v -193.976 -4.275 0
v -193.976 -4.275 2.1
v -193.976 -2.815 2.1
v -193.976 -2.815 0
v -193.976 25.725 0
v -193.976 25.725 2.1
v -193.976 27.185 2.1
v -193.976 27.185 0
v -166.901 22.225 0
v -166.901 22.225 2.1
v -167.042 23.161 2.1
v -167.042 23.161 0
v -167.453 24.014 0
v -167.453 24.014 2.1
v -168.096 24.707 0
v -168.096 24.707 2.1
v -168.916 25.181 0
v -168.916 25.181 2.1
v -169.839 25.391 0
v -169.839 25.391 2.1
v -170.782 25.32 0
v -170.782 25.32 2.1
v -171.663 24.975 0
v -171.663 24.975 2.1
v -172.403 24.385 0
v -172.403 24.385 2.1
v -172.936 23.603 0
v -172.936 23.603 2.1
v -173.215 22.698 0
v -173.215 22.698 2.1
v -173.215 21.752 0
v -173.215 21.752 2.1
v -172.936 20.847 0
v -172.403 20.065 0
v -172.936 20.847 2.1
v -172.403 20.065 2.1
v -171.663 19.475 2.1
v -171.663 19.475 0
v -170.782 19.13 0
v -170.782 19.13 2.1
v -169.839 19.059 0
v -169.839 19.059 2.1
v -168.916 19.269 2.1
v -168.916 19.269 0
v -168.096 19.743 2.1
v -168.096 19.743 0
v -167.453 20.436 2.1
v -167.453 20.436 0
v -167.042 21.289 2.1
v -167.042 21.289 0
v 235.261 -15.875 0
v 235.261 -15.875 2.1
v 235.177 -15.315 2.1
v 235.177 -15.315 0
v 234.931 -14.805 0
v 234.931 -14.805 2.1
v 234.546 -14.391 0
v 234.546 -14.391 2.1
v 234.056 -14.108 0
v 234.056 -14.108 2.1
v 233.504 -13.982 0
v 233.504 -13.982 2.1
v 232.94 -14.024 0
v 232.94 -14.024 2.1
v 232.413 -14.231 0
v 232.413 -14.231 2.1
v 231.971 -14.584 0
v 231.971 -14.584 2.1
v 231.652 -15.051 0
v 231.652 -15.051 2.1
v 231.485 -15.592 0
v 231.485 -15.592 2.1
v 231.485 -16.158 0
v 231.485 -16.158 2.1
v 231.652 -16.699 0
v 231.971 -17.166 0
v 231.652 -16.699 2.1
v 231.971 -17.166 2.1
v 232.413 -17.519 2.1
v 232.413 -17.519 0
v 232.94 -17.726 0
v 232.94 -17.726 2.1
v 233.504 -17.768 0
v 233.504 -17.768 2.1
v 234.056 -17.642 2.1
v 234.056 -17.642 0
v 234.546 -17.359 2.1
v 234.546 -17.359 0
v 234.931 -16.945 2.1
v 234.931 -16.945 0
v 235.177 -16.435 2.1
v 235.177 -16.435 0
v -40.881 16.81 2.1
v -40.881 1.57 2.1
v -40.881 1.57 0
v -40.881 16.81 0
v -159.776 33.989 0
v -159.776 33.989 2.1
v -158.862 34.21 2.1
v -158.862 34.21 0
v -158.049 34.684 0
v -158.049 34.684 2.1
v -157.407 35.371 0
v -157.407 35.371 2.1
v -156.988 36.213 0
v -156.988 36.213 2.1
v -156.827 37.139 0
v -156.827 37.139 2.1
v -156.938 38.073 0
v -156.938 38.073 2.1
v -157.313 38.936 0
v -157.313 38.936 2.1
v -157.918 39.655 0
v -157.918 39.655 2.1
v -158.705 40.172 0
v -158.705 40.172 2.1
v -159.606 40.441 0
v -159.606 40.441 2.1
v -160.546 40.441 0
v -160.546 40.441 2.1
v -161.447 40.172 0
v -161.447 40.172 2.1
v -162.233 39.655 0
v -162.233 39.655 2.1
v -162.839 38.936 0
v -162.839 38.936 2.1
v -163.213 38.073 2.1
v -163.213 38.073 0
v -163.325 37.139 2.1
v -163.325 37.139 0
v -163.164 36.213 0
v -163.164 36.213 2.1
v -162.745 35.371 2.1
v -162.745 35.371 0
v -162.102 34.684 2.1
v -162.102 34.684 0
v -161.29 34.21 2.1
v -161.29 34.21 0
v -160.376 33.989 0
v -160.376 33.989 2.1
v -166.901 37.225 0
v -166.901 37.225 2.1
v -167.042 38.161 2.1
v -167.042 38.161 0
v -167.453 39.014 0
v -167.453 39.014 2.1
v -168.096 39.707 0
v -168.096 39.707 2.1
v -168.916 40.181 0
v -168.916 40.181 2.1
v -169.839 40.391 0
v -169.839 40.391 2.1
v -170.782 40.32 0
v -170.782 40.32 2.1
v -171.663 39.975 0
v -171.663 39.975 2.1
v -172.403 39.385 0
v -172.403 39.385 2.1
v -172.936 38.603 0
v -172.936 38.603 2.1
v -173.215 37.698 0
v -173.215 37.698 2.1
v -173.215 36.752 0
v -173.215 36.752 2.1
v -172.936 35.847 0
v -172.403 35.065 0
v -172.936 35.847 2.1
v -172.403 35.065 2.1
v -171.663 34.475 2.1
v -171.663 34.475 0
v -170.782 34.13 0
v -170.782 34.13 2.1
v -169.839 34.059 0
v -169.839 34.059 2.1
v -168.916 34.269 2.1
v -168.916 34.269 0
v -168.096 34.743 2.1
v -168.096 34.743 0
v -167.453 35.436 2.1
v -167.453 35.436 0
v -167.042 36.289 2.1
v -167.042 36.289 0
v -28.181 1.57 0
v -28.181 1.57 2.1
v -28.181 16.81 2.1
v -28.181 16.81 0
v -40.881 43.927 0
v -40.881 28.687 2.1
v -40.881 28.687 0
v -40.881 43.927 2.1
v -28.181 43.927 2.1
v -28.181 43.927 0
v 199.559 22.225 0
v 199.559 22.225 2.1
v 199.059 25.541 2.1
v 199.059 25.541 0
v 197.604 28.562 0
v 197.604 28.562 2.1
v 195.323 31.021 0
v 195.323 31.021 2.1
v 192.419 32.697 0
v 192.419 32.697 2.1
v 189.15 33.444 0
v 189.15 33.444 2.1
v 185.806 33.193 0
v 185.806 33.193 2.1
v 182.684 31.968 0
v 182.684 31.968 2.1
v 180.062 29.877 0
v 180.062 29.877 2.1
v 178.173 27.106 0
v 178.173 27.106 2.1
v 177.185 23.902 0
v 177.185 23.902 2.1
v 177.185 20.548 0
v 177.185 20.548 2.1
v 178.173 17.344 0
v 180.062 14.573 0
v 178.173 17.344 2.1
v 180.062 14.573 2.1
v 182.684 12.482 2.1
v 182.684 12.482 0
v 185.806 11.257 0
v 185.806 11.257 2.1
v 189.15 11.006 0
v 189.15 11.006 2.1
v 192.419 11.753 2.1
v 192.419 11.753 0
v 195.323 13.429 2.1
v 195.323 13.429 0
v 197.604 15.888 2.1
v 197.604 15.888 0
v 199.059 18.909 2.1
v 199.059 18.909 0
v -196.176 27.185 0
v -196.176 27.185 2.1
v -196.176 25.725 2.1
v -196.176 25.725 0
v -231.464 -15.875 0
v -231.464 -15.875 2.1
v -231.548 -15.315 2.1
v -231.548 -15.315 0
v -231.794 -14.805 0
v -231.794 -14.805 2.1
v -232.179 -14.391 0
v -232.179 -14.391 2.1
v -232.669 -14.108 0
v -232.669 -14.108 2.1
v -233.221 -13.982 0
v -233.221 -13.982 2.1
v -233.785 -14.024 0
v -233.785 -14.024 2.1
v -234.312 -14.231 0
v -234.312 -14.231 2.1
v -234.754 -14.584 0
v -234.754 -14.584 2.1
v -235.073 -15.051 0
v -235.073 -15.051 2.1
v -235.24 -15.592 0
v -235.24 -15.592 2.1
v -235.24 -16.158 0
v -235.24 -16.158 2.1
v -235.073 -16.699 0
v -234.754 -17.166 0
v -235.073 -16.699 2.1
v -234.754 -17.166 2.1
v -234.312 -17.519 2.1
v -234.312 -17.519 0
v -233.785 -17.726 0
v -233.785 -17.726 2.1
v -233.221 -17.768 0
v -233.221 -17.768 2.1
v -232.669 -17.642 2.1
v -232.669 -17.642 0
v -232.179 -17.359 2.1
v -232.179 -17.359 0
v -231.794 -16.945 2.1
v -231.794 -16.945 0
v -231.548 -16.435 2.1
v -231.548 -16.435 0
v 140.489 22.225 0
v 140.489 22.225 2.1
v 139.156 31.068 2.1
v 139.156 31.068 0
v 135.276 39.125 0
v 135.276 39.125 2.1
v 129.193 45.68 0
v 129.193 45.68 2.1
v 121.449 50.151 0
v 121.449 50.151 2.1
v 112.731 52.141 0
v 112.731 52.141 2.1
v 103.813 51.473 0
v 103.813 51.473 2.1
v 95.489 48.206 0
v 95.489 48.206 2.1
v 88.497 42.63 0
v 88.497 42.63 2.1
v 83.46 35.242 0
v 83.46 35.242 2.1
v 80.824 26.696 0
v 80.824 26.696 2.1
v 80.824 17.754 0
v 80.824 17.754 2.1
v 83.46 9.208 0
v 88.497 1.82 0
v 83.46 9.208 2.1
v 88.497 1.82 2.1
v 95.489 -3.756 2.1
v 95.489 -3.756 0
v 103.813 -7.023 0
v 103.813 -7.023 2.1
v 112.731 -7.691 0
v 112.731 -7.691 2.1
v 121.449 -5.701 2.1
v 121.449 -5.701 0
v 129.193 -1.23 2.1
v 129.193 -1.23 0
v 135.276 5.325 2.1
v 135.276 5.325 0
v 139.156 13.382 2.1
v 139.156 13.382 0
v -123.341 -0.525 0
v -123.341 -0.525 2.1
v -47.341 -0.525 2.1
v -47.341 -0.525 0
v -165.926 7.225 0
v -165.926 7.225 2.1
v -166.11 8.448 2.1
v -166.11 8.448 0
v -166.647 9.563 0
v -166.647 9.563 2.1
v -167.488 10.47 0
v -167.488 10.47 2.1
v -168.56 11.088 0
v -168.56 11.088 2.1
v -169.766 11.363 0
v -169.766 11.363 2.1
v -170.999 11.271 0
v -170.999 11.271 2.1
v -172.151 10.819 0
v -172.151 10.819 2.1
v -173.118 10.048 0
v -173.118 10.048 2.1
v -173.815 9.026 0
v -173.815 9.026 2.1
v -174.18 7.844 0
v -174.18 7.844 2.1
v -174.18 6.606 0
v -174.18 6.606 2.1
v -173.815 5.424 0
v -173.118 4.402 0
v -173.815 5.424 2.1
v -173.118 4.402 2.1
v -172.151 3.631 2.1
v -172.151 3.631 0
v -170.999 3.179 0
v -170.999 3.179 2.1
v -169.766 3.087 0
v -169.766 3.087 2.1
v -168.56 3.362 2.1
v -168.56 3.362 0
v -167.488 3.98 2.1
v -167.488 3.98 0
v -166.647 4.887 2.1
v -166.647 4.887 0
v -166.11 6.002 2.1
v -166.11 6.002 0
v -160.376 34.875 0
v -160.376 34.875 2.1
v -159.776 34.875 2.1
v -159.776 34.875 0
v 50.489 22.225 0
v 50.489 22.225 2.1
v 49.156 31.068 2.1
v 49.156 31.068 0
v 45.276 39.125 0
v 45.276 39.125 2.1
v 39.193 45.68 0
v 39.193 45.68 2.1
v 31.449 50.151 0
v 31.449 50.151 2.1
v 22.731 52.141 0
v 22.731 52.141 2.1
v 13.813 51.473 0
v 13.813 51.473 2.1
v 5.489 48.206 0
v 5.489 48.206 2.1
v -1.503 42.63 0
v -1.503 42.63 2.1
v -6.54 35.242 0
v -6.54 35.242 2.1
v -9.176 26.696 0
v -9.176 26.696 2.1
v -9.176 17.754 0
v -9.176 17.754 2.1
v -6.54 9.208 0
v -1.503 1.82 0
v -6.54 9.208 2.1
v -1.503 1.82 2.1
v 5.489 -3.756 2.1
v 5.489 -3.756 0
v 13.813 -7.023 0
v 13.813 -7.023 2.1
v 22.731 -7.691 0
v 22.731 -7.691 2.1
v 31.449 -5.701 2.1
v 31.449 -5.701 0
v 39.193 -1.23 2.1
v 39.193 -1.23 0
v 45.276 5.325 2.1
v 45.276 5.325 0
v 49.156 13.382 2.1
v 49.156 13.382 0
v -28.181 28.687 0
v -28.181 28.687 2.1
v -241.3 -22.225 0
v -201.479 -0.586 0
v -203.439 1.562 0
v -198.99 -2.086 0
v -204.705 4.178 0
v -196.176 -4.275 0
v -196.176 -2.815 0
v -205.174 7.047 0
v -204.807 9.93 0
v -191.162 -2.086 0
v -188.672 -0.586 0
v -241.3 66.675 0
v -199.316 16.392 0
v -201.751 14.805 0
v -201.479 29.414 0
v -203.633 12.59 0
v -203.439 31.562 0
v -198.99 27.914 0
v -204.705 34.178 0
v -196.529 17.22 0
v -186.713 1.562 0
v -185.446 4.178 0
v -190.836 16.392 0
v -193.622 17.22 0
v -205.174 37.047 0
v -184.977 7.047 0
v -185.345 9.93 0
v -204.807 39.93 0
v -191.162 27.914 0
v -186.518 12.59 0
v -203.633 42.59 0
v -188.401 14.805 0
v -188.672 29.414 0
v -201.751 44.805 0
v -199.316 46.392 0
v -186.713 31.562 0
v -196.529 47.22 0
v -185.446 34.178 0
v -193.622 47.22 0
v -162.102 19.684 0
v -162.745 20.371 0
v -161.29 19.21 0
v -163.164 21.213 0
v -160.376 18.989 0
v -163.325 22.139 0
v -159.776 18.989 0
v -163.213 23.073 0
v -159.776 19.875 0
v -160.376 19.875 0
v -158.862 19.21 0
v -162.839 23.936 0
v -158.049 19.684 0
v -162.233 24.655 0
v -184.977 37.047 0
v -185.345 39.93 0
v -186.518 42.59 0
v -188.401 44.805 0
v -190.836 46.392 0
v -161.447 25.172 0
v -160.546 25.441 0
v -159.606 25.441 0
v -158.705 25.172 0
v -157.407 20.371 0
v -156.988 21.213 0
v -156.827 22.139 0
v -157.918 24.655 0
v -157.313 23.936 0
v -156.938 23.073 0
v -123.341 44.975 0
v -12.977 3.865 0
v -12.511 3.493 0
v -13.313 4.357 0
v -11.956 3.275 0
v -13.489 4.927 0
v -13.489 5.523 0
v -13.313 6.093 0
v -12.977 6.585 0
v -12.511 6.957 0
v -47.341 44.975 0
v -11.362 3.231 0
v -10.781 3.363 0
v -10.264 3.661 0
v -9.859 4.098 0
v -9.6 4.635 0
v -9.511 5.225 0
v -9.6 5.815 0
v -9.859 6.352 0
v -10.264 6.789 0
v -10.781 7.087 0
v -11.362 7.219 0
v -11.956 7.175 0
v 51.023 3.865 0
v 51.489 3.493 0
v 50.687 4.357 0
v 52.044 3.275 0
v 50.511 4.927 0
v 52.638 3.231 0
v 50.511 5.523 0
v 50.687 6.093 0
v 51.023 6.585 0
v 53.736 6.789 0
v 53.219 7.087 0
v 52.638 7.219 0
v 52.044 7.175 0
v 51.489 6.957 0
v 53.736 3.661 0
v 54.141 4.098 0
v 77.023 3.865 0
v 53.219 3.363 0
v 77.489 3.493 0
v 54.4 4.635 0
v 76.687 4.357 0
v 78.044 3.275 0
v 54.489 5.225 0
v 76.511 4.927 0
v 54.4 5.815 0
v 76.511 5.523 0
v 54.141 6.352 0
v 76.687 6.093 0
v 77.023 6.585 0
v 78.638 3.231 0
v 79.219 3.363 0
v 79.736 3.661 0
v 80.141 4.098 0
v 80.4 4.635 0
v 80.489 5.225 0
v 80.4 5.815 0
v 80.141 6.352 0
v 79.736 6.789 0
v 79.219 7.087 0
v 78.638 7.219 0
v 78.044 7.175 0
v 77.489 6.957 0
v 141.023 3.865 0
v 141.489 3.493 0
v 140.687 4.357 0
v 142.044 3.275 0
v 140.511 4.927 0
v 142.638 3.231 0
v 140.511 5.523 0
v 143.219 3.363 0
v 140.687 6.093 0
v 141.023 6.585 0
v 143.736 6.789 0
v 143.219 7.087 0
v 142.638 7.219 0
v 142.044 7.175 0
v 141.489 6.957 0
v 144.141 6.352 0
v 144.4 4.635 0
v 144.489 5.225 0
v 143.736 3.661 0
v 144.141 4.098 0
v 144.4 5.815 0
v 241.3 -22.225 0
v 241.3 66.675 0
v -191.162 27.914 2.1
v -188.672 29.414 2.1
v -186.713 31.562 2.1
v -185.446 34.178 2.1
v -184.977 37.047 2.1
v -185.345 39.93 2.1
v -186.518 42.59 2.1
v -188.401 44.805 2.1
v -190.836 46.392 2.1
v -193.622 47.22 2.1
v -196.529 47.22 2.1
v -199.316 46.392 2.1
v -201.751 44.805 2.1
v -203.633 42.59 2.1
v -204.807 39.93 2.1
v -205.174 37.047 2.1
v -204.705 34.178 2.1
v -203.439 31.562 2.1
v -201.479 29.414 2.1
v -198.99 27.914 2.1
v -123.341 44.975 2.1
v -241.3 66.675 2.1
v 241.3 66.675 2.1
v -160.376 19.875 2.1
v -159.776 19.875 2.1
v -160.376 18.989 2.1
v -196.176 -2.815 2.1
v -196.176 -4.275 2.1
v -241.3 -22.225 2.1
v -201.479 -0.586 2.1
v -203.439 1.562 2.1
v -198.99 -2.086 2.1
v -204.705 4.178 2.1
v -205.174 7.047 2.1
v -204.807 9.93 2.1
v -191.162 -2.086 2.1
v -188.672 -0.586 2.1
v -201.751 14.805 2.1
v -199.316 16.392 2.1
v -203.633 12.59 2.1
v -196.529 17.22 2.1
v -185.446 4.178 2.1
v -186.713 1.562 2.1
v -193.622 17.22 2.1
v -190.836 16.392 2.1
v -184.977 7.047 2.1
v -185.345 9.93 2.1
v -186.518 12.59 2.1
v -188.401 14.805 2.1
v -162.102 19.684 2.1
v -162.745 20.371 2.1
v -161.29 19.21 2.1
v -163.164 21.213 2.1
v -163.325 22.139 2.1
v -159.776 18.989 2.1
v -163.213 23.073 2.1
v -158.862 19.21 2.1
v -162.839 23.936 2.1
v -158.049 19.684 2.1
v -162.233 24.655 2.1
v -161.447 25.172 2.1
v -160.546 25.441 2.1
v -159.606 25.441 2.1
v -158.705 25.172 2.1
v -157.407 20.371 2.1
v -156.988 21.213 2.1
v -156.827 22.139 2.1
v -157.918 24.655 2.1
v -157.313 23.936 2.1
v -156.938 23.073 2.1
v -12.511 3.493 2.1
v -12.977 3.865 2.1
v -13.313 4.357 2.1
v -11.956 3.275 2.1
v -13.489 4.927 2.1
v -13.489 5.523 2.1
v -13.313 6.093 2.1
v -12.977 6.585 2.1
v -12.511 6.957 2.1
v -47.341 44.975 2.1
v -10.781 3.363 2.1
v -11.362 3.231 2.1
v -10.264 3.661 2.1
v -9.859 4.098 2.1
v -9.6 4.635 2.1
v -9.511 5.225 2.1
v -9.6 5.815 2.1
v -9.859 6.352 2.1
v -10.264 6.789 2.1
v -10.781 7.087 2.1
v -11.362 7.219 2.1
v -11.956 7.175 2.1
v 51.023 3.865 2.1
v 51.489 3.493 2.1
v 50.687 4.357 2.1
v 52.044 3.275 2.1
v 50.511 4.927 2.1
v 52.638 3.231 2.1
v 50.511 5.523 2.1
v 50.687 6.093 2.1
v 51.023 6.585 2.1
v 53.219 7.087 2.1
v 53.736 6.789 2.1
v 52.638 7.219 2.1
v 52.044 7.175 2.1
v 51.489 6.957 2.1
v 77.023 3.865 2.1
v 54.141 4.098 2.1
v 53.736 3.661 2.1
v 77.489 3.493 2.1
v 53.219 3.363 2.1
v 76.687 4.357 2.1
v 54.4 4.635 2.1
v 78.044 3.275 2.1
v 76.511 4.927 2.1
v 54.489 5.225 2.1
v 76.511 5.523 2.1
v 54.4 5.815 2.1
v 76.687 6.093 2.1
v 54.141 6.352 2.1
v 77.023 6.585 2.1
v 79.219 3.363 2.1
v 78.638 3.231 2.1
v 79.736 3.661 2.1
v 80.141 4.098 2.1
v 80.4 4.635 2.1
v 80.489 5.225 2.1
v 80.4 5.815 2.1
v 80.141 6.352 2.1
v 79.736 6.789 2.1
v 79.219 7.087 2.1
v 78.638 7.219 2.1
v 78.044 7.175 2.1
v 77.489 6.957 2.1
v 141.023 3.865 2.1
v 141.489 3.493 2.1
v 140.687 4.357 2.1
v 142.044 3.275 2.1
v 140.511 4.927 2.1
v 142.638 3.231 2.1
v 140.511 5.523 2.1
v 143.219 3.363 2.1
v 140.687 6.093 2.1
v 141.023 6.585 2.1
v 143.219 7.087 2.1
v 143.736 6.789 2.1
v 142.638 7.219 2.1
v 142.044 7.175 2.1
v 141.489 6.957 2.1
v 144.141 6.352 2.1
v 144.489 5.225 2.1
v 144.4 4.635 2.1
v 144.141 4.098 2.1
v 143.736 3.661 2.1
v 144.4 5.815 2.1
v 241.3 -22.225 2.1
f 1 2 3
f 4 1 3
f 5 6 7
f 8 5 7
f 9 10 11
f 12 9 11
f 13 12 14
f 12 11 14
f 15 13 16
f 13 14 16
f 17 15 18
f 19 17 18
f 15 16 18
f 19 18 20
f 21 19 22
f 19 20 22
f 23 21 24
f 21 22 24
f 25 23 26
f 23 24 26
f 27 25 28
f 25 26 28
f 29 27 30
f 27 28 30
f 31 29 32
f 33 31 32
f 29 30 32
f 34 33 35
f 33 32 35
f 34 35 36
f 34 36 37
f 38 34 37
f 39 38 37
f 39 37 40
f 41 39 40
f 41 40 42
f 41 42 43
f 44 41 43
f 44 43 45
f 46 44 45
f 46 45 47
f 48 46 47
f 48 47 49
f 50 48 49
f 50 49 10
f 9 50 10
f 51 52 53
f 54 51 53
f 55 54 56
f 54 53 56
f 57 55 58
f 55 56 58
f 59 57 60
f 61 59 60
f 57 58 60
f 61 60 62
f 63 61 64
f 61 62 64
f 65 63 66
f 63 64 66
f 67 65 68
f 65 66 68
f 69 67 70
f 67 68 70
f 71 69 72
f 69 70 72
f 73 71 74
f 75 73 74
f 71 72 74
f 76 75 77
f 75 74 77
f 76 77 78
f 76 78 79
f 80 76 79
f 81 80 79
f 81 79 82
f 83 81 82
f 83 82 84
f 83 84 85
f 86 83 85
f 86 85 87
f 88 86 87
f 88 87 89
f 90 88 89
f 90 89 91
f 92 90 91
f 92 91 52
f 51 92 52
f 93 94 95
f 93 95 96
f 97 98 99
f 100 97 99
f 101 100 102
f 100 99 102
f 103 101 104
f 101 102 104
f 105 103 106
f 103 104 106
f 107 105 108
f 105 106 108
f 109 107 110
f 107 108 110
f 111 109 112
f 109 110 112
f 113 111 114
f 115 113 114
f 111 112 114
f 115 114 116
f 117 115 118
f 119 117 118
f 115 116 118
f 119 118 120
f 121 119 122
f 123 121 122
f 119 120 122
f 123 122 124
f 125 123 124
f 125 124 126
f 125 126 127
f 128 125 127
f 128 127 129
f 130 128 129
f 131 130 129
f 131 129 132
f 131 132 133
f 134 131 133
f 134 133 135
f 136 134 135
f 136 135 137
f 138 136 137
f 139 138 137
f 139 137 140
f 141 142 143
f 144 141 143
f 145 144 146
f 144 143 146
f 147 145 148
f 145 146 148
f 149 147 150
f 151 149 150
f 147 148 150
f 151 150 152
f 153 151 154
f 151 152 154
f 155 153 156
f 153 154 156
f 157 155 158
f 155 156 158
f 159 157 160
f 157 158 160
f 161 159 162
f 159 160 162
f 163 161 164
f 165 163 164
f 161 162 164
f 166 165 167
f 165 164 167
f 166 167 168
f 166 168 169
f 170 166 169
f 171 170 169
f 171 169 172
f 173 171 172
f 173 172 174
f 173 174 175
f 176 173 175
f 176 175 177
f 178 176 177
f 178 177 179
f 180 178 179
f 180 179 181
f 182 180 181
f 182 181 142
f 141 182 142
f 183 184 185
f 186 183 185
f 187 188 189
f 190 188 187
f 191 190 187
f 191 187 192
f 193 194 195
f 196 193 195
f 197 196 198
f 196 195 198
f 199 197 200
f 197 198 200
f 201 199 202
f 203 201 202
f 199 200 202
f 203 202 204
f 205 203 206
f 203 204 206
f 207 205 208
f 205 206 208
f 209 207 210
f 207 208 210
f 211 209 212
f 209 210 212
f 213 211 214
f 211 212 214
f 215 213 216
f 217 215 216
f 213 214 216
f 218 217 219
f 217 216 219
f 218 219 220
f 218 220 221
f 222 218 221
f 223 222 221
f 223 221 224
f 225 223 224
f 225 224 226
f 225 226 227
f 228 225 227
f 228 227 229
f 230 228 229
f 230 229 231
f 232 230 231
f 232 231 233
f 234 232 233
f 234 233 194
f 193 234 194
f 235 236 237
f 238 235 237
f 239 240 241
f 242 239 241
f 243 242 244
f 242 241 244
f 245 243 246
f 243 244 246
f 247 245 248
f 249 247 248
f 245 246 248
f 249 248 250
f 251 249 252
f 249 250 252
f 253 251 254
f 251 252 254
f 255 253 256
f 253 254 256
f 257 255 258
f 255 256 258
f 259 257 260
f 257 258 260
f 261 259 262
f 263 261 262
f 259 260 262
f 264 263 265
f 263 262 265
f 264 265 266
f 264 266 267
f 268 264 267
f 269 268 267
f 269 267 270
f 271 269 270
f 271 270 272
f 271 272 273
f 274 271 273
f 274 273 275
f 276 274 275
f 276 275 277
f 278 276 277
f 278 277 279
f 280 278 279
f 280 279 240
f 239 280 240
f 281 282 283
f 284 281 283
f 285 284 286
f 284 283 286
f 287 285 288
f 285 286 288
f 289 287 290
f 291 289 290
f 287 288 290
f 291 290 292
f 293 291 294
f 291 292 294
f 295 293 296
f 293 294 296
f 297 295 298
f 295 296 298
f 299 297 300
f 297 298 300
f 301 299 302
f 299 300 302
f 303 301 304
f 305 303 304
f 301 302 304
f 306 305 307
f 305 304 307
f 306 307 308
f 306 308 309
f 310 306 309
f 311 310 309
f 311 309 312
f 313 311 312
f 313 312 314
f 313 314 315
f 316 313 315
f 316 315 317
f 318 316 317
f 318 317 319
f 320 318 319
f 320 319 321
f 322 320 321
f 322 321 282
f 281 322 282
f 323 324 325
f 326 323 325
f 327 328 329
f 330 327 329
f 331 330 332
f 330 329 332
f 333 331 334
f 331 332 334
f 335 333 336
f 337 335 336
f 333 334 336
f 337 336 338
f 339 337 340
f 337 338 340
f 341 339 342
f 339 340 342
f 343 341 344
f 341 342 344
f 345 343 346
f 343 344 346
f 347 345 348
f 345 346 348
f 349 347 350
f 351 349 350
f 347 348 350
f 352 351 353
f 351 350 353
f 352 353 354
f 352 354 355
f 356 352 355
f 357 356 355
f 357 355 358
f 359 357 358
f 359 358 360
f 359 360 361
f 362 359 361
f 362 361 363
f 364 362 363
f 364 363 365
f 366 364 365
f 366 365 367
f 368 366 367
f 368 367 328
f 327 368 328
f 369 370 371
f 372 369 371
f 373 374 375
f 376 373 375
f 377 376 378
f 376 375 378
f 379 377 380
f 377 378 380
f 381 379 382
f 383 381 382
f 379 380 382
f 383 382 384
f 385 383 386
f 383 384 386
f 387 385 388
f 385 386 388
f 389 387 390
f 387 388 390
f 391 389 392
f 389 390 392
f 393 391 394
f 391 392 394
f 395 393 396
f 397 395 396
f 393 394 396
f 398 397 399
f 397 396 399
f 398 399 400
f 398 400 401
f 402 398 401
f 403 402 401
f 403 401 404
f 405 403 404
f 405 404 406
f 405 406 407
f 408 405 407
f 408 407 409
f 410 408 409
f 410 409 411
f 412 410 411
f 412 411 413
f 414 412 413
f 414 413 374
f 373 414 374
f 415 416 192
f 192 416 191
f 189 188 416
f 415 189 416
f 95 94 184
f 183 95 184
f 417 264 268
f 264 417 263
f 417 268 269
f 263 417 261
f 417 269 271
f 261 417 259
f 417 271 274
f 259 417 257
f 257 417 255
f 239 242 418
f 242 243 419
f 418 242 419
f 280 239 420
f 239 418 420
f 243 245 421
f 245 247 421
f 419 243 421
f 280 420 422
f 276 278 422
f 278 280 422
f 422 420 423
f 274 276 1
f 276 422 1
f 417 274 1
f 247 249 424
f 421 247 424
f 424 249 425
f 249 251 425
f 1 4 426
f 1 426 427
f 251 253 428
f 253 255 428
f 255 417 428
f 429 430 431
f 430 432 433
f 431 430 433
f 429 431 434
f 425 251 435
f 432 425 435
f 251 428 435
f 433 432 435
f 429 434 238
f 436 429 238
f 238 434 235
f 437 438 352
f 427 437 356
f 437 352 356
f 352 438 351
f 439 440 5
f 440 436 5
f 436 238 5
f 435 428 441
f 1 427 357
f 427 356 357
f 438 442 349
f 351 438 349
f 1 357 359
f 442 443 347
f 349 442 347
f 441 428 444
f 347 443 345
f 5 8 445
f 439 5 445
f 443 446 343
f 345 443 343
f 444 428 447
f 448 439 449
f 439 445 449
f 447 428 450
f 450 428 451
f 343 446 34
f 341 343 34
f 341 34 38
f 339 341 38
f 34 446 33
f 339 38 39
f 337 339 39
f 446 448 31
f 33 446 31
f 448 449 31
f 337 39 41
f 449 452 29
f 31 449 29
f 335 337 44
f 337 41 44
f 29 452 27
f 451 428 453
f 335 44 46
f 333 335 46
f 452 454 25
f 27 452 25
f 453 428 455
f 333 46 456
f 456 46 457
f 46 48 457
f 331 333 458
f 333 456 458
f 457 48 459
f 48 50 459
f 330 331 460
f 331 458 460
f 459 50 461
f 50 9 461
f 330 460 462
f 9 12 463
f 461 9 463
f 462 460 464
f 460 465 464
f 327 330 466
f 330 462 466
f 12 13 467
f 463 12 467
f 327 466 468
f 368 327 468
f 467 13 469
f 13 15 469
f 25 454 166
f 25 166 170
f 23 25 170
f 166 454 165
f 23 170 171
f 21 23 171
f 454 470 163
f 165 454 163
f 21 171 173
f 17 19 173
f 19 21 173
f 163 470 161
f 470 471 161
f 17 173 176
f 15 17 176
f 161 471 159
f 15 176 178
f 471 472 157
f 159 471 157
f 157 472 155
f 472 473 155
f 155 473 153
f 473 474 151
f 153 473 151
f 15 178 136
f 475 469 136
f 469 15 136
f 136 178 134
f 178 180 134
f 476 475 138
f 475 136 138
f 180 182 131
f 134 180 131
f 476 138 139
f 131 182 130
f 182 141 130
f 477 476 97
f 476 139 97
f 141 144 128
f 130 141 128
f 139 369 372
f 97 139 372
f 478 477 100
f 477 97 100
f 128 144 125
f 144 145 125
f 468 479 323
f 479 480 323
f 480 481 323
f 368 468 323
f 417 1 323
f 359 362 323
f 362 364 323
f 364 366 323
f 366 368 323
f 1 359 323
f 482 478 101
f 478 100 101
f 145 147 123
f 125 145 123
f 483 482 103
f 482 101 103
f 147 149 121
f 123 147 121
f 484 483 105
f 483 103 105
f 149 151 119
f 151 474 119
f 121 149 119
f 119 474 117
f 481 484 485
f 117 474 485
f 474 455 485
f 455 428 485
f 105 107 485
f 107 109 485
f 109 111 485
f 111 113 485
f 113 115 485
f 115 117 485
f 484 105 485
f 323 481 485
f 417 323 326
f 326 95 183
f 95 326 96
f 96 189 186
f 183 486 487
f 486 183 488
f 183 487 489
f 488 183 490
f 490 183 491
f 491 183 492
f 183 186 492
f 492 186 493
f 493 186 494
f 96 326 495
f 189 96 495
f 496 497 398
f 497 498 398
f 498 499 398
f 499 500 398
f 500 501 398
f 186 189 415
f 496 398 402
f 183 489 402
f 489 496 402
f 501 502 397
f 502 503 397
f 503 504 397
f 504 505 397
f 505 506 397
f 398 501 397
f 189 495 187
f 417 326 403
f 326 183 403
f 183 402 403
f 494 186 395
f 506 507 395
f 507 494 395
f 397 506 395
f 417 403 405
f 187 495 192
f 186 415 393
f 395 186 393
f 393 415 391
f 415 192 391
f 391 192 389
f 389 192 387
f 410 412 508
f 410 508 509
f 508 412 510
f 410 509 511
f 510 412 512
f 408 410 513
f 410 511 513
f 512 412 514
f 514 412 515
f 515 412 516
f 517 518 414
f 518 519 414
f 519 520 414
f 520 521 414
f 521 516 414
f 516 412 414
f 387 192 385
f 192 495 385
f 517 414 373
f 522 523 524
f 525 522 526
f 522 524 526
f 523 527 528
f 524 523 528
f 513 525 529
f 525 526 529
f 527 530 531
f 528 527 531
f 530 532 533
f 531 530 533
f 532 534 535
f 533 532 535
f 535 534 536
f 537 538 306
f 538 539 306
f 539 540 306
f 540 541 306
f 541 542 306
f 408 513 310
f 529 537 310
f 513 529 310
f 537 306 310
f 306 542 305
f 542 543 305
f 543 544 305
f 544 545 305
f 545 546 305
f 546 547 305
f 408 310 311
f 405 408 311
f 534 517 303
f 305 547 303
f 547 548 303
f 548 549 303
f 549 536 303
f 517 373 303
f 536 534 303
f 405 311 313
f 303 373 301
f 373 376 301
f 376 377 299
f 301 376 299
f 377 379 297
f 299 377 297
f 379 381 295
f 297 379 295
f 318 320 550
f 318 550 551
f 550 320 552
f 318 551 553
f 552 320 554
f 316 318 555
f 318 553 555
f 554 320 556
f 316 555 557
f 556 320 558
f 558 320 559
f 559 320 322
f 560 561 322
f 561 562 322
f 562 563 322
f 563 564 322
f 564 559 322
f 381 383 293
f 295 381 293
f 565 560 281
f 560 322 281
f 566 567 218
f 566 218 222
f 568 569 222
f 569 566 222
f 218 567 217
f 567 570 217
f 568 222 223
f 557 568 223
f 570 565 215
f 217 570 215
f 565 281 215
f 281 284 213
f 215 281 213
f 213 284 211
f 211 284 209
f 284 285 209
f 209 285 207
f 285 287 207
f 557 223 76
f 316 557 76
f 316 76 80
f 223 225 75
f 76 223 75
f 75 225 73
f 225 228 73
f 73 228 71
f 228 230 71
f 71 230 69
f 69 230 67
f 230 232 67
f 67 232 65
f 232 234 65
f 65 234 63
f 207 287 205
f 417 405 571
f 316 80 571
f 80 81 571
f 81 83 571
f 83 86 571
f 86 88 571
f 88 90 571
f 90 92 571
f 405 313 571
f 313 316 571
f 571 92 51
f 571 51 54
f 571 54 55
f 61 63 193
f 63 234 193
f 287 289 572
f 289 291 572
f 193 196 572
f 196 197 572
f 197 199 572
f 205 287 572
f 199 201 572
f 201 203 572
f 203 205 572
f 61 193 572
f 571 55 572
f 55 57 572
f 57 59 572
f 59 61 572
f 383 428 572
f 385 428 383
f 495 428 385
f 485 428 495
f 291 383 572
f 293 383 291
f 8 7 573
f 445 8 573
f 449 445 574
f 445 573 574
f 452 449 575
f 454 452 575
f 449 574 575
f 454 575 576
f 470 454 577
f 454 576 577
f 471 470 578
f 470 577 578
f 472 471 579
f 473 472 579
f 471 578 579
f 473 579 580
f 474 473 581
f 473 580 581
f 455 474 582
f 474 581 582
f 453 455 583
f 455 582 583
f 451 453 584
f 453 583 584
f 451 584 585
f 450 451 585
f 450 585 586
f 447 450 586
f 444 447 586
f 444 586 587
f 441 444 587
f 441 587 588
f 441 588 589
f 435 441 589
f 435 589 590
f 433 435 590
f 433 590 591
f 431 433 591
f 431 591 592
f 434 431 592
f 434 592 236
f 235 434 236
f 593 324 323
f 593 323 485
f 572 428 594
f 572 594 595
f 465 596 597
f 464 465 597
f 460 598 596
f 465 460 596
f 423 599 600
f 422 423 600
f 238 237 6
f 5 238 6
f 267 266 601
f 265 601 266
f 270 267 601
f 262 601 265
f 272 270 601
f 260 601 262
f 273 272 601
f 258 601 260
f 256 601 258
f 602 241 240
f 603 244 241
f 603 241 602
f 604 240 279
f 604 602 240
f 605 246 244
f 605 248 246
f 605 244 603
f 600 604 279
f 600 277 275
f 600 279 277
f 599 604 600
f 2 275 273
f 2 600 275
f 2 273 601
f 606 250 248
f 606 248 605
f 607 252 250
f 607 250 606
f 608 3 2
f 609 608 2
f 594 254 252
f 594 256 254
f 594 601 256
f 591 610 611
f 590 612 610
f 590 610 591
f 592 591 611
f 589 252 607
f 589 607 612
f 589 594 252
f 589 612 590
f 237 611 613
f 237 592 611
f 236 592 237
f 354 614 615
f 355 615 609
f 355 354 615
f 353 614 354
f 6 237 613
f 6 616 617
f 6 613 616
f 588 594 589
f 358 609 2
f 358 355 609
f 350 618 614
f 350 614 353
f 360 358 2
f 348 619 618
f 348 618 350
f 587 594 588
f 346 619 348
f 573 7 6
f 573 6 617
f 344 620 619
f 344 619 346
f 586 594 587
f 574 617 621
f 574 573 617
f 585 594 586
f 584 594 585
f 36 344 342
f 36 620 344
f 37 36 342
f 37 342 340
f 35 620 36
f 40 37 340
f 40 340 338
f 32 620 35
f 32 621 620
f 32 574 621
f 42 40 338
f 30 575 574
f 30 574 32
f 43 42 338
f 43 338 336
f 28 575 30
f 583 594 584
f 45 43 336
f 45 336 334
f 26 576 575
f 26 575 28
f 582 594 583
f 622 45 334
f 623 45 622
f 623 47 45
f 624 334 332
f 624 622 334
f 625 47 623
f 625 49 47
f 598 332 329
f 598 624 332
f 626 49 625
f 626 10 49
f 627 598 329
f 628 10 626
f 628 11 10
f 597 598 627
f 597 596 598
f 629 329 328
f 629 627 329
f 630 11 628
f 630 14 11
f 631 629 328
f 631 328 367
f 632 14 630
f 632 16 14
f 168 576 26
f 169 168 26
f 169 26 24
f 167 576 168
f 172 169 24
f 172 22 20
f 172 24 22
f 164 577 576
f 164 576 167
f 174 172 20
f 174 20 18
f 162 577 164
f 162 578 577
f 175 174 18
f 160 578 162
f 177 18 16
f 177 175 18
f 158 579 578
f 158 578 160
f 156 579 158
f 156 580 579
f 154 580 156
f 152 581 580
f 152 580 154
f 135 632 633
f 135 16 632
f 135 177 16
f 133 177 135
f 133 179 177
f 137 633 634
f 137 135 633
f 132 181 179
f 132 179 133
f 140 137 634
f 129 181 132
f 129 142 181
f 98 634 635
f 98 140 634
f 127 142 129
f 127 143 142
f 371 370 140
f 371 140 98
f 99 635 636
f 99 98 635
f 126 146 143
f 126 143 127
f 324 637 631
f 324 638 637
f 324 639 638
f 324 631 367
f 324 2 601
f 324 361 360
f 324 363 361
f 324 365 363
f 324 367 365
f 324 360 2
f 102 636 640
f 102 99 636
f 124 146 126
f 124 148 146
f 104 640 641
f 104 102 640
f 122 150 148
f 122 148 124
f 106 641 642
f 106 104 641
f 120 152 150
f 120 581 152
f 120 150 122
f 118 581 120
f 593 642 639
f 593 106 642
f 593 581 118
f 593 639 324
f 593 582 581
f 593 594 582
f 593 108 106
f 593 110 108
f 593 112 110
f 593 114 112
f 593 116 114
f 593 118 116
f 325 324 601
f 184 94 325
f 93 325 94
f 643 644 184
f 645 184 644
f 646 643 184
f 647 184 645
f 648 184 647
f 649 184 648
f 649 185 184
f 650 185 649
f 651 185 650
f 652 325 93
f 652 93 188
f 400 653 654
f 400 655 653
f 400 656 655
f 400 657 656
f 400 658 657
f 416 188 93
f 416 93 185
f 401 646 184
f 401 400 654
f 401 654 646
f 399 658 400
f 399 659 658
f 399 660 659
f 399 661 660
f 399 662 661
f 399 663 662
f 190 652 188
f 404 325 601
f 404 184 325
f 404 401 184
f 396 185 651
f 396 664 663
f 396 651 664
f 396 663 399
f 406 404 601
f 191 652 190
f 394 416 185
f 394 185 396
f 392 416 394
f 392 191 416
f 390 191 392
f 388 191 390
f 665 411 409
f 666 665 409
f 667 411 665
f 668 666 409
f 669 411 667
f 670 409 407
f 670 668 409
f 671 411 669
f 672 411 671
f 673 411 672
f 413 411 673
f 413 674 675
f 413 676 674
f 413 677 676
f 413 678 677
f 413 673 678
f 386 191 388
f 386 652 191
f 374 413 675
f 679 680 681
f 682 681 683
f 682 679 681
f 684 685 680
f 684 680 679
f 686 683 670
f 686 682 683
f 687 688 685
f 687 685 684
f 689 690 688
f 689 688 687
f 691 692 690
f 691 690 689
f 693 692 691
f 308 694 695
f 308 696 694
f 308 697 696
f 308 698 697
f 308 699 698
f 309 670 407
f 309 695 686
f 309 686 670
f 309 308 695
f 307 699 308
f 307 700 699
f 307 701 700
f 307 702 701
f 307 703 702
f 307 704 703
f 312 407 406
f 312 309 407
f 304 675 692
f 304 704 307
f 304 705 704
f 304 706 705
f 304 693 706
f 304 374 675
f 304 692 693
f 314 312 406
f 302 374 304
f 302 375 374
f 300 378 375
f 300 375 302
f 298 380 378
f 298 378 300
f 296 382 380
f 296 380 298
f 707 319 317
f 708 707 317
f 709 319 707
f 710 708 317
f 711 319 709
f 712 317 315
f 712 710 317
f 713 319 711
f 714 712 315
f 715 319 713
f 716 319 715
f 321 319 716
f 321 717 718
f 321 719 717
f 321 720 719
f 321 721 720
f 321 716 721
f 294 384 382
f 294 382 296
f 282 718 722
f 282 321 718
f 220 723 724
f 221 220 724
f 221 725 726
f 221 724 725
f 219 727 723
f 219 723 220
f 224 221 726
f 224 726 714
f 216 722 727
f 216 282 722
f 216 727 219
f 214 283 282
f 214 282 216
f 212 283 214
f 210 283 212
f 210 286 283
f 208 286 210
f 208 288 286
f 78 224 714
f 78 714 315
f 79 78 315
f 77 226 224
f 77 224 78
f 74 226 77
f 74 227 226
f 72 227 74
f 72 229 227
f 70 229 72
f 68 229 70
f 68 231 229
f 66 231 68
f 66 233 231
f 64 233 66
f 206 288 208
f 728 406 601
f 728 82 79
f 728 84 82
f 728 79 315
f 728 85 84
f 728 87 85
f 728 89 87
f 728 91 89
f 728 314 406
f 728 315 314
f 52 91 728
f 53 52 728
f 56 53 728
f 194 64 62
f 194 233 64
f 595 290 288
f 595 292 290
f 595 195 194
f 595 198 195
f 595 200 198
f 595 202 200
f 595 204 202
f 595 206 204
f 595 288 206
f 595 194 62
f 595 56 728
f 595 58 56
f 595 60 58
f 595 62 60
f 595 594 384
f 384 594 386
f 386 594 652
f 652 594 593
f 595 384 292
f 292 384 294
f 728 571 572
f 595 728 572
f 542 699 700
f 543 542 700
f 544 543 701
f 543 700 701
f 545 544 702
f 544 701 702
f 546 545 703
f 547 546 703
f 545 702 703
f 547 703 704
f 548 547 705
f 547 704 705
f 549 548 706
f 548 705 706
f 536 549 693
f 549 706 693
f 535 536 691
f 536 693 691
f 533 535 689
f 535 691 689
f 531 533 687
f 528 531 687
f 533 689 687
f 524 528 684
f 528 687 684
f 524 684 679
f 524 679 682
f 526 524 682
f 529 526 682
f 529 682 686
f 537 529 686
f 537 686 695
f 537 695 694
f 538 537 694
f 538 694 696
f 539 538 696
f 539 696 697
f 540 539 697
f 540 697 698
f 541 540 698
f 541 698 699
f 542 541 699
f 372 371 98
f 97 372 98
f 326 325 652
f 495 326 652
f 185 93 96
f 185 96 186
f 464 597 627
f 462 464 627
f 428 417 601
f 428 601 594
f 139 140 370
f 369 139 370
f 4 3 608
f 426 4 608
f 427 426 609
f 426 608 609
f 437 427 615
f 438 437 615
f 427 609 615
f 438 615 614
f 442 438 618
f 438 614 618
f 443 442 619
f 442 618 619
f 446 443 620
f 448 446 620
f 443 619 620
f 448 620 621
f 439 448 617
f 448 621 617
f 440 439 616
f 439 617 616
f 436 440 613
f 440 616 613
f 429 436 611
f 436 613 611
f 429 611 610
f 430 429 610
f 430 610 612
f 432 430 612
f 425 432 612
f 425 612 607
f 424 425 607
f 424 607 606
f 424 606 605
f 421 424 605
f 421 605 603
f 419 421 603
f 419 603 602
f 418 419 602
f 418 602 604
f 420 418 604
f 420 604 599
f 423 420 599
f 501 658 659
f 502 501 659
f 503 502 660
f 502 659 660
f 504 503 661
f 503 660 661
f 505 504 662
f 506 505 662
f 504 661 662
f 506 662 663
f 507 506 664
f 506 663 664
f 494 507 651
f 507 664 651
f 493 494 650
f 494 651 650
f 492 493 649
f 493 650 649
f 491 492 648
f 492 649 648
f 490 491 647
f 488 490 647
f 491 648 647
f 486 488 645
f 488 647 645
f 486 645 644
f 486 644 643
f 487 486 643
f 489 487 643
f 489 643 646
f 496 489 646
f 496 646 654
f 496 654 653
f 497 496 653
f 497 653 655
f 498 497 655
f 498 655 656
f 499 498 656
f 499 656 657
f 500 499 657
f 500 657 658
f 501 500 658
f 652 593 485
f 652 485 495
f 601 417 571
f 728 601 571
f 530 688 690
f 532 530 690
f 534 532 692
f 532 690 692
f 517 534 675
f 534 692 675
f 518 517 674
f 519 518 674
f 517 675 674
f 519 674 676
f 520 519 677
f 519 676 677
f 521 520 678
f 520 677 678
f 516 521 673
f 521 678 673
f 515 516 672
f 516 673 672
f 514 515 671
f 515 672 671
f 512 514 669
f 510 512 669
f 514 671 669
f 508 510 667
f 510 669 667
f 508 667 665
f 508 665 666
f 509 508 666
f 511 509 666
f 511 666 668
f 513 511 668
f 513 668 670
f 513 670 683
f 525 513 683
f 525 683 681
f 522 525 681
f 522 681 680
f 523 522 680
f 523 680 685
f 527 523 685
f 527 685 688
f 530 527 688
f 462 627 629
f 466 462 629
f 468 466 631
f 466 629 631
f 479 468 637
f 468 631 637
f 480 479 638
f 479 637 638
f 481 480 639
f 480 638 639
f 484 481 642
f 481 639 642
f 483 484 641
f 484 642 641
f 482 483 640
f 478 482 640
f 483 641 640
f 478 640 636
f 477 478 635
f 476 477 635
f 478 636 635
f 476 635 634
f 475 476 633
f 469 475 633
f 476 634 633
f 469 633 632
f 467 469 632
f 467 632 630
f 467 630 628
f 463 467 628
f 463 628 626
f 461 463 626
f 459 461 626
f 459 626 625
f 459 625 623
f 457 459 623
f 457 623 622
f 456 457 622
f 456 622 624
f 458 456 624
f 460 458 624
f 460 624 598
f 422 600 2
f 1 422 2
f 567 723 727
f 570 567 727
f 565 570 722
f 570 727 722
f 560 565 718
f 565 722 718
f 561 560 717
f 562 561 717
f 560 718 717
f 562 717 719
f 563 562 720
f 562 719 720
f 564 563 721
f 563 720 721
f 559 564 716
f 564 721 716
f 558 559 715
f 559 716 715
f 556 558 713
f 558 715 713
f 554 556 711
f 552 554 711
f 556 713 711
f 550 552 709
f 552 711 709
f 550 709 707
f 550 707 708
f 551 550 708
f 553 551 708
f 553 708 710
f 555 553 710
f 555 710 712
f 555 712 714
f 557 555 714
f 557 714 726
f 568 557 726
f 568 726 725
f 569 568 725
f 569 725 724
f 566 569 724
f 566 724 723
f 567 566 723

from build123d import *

# Parameters (mm, degrees)
SKETCH1_W              = 482.6
SKETCH1_H              = 88.9
FRONT_PANEL_DEPTH      = 2.1
MOUNTING_HOLES_REACH   = 252.351
SKETCH7_R              = 1.89865
START_STOP_DEPTH       = 251.351064757
SKETCH3_R              = 3.175
MODE_SELECT_DEPTH      = 251.351064757
SKETCH4_W              = 76
SKETCH4_H              = 45.5
LCD_CUTOUT_DEPTH       = 251.351064757
SKETCH5_R              = 11.25
E_STOP_CUTOUT_DEPTH    = 251.351064757
SKETCH6_W              = 12.7
SKETCH6_H              = 15.24
LCD_PUSHBUTTONS_DEPTH  = 251.351064757
ERROR_INDICATOR_REACH  = 252.351
SKETCH8_R              = 4.15
PANEL_METER_CUTOUT_R   = 30
PANEL_METER_CUTOUT_R_2 = 2
PANEL_METER_DEPTH      = 251.351064757
LPATTERN1_COUNT        = 2
LPATTERN1_PITCH        = 90


with BuildPart() as part:
    # Sketch1 → Front panel (new body)
    with BuildSketch(Plane.XY):
        with Locations((0, 22.225)):
            Rectangle(SKETCH1_W, SKETCH1_H)
    extrude(amount=FRONT_PANEL_DEPTH)

    # Sketch7 → Mounting holes (cut, up to next)
    with BuildSketch(Plane.XY.offset(2.1), mode=Mode.PRIVATE) as mounting_holes_sk1:
        with Locations((-233.3625, -15.875)):
            Circle(SKETCH7_R)
    mounting_holes_tool1 = extrude(mounting_holes_sk1.sketch, amount=-MOUNTING_HOLES_REACH, mode=Mode.PRIVATE) & part.part
    # Sketch7 → Mounting holes (cut, up to next)
    with BuildSketch(Plane.XY.offset(2.1), mode=Mode.PRIVATE) as mounting_holes_sk2:
        with Locations((233.3625, -15.875)):
            Circle(SKETCH7_R)
    mounting_holes_tool2 = extrude(mounting_holes_sk2.sketch, amount=-MOUNTING_HOLES_REACH, mode=Mode.PRIVATE) & part.part
    add(mounting_holes_tool1.solids().sort_by_distance((-233.3625, -15.875, 2.1))[0], mode=Mode.SUBTRACT)
    add(mounting_holes_tool2.solids().sort_by_distance((233.3625, -15.875, 2.1))[0], mode=Mode.SUBTRACT)

    # Sketch2 → Start/stop (cut, through all)
    with BuildSketch(Plane.XY.offset(2.1)):
        with BuildLine():
            Line((-196.175880429, 27.185079682), (-196.175880429, 25.725))
            Line((-196.175880429, 25.725), (-193.975880429, 25.725))
            Line((-193.975880429, 25.725), (-193.975880429, 27.185079682))
            ThreePointArc((-193.975880429, 27.185079682), (-195.075880429, 47.325), (-196.175880429, 27.185079682))
        make_face()
        with BuildLine():
            Line((-196.175880429, -2.814920318), (-196.175880429, -4.275))
            Line((-196.175880429, -4.275), (-193.975880429, -4.275))
            Line((-193.975880429, -4.275), (-193.975880429, -2.814920318))
            ThreePointArc((-193.975880429, -2.814920318), (-195.075880429, 17.325), (-196.175880429, -2.814920318))
        make_face()
    extrude(amount=-START_STOP_DEPTH, mode=Mode.SUBTRACT)

    # Sketch3 → Mode select (cut, through all)
    with BuildSketch(Plane.XY.offset(2.1)):
        with Locations((-170.075880429, 37.225)):
            Circle(SKETCH3_R)
        with Locations((-170.075880429, 22.225)):
            Circle(SKETCH3_R)
        with BuildLine():
            Line((-160.375880429, 33.988875775), (-160.375880429, 34.875))
            Line((-160.375880429, 34.875), (-159.775880429, 34.875))
            Line((-159.775880429, 34.875), (-159.775880429, 33.988875775))
            ThreePointArc((-159.775880429, 33.988875775), (-160.075880429, 40.475), (-160.375880429, 33.988875775))
        make_face()
        with BuildLine():
            Line((-160.375880429, 18.988875775), (-160.375880429, 19.875))
            Line((-160.375880429, 19.875), (-159.775880429, 19.875))
            Line((-159.775880429, 19.875), (-159.775880429, 18.988875775))
            ThreePointArc((-159.775880429, 18.988875775), (-160.075880429, 25.475), (-160.375880429, 18.988875775))
        make_face()
    extrude(amount=-MODE_SELECT_DEPTH, mode=Mode.SUBTRACT)

    # Sketch4 → LCD cutout (cut, through all)
    with BuildSketch(Plane.XY.offset(2.1)):
        with Locations((-85.340826022, 22.225)):
            Rectangle(SKETCH4_W, SKETCH4_H)
    extrude(amount=-LCD_CUTOUT_DEPTH, mode=Mode.SUBTRACT)

    # Sketch5 → E-stop cutout (cut, through all)
    with BuildSketch(Plane.XY.offset(2.1)):
        with Locations((188.308959836, 22.225)):
            Circle(SKETCH5_R)
    extrude(amount=-E_STOP_CUTOUT_DEPTH, mode=Mode.SUBTRACT)

    # Sketch6 → LCD pushbuttons (cut, through all)
    with BuildSketch(Plane.XY.offset(2.1)):
        with Locations((-34.530826022, 36.3075)):
            Rectangle(SKETCH6_W, SKETCH6_H)
        with Locations((-34.530826022, 9.19)):
            Rectangle(SKETCH6_W, SKETCH6_H)
    extrude(amount=-LCD_PUSHBUTTONS_DEPTH, mode=Mode.SUBTRACT)

    # Sketch8 → ERROR indicator (cut, up to next)
    with BuildSketch(Plane.XY.offset(2.1), mode=Mode.PRIVATE) as error_indicator_sk1:
        with Locations((-170.075880429, 7.225)):
            Circle(SKETCH8_R)
    error_indicator_tool1 = extrude(error_indicator_sk1.sketch, amount=-ERROR_INDICATOR_REACH, mode=Mode.PRIVATE) & part.part
    add(error_indicator_tool1.solids().sort_by_distance((-170.07588, 7.225, 2.1))[0], mode=Mode.SUBTRACT)

    # Panel meter cutout → Panel meter (cut, through all)
    with BuildSketch(Plane.XY.offset(2.1)):
        with Locations((20.488631919, 22.225)):
            Circle(PANEL_METER_CUTOUT_R)
        with Locations((52.488631919, 5.225)):
            Circle(PANEL_METER_CUTOUT_R_2)
        with Locations((-11.511368081, 5.225)):
            Circle(PANEL_METER_CUTOUT_R_2)
    panel_meter = extrude(amount=-PANEL_METER_DEPTH, mode=Mode.SUBTRACT)

    # LPattern1: Panel meter ×2
    with Locations(*[(i * LPATTERN1_PITCH, 0, 0) for i in range(1, LPATTERN1_COUNT)]):
        add(panel_meter, mode=Mode.SUBTRACT)


solid = part.part
